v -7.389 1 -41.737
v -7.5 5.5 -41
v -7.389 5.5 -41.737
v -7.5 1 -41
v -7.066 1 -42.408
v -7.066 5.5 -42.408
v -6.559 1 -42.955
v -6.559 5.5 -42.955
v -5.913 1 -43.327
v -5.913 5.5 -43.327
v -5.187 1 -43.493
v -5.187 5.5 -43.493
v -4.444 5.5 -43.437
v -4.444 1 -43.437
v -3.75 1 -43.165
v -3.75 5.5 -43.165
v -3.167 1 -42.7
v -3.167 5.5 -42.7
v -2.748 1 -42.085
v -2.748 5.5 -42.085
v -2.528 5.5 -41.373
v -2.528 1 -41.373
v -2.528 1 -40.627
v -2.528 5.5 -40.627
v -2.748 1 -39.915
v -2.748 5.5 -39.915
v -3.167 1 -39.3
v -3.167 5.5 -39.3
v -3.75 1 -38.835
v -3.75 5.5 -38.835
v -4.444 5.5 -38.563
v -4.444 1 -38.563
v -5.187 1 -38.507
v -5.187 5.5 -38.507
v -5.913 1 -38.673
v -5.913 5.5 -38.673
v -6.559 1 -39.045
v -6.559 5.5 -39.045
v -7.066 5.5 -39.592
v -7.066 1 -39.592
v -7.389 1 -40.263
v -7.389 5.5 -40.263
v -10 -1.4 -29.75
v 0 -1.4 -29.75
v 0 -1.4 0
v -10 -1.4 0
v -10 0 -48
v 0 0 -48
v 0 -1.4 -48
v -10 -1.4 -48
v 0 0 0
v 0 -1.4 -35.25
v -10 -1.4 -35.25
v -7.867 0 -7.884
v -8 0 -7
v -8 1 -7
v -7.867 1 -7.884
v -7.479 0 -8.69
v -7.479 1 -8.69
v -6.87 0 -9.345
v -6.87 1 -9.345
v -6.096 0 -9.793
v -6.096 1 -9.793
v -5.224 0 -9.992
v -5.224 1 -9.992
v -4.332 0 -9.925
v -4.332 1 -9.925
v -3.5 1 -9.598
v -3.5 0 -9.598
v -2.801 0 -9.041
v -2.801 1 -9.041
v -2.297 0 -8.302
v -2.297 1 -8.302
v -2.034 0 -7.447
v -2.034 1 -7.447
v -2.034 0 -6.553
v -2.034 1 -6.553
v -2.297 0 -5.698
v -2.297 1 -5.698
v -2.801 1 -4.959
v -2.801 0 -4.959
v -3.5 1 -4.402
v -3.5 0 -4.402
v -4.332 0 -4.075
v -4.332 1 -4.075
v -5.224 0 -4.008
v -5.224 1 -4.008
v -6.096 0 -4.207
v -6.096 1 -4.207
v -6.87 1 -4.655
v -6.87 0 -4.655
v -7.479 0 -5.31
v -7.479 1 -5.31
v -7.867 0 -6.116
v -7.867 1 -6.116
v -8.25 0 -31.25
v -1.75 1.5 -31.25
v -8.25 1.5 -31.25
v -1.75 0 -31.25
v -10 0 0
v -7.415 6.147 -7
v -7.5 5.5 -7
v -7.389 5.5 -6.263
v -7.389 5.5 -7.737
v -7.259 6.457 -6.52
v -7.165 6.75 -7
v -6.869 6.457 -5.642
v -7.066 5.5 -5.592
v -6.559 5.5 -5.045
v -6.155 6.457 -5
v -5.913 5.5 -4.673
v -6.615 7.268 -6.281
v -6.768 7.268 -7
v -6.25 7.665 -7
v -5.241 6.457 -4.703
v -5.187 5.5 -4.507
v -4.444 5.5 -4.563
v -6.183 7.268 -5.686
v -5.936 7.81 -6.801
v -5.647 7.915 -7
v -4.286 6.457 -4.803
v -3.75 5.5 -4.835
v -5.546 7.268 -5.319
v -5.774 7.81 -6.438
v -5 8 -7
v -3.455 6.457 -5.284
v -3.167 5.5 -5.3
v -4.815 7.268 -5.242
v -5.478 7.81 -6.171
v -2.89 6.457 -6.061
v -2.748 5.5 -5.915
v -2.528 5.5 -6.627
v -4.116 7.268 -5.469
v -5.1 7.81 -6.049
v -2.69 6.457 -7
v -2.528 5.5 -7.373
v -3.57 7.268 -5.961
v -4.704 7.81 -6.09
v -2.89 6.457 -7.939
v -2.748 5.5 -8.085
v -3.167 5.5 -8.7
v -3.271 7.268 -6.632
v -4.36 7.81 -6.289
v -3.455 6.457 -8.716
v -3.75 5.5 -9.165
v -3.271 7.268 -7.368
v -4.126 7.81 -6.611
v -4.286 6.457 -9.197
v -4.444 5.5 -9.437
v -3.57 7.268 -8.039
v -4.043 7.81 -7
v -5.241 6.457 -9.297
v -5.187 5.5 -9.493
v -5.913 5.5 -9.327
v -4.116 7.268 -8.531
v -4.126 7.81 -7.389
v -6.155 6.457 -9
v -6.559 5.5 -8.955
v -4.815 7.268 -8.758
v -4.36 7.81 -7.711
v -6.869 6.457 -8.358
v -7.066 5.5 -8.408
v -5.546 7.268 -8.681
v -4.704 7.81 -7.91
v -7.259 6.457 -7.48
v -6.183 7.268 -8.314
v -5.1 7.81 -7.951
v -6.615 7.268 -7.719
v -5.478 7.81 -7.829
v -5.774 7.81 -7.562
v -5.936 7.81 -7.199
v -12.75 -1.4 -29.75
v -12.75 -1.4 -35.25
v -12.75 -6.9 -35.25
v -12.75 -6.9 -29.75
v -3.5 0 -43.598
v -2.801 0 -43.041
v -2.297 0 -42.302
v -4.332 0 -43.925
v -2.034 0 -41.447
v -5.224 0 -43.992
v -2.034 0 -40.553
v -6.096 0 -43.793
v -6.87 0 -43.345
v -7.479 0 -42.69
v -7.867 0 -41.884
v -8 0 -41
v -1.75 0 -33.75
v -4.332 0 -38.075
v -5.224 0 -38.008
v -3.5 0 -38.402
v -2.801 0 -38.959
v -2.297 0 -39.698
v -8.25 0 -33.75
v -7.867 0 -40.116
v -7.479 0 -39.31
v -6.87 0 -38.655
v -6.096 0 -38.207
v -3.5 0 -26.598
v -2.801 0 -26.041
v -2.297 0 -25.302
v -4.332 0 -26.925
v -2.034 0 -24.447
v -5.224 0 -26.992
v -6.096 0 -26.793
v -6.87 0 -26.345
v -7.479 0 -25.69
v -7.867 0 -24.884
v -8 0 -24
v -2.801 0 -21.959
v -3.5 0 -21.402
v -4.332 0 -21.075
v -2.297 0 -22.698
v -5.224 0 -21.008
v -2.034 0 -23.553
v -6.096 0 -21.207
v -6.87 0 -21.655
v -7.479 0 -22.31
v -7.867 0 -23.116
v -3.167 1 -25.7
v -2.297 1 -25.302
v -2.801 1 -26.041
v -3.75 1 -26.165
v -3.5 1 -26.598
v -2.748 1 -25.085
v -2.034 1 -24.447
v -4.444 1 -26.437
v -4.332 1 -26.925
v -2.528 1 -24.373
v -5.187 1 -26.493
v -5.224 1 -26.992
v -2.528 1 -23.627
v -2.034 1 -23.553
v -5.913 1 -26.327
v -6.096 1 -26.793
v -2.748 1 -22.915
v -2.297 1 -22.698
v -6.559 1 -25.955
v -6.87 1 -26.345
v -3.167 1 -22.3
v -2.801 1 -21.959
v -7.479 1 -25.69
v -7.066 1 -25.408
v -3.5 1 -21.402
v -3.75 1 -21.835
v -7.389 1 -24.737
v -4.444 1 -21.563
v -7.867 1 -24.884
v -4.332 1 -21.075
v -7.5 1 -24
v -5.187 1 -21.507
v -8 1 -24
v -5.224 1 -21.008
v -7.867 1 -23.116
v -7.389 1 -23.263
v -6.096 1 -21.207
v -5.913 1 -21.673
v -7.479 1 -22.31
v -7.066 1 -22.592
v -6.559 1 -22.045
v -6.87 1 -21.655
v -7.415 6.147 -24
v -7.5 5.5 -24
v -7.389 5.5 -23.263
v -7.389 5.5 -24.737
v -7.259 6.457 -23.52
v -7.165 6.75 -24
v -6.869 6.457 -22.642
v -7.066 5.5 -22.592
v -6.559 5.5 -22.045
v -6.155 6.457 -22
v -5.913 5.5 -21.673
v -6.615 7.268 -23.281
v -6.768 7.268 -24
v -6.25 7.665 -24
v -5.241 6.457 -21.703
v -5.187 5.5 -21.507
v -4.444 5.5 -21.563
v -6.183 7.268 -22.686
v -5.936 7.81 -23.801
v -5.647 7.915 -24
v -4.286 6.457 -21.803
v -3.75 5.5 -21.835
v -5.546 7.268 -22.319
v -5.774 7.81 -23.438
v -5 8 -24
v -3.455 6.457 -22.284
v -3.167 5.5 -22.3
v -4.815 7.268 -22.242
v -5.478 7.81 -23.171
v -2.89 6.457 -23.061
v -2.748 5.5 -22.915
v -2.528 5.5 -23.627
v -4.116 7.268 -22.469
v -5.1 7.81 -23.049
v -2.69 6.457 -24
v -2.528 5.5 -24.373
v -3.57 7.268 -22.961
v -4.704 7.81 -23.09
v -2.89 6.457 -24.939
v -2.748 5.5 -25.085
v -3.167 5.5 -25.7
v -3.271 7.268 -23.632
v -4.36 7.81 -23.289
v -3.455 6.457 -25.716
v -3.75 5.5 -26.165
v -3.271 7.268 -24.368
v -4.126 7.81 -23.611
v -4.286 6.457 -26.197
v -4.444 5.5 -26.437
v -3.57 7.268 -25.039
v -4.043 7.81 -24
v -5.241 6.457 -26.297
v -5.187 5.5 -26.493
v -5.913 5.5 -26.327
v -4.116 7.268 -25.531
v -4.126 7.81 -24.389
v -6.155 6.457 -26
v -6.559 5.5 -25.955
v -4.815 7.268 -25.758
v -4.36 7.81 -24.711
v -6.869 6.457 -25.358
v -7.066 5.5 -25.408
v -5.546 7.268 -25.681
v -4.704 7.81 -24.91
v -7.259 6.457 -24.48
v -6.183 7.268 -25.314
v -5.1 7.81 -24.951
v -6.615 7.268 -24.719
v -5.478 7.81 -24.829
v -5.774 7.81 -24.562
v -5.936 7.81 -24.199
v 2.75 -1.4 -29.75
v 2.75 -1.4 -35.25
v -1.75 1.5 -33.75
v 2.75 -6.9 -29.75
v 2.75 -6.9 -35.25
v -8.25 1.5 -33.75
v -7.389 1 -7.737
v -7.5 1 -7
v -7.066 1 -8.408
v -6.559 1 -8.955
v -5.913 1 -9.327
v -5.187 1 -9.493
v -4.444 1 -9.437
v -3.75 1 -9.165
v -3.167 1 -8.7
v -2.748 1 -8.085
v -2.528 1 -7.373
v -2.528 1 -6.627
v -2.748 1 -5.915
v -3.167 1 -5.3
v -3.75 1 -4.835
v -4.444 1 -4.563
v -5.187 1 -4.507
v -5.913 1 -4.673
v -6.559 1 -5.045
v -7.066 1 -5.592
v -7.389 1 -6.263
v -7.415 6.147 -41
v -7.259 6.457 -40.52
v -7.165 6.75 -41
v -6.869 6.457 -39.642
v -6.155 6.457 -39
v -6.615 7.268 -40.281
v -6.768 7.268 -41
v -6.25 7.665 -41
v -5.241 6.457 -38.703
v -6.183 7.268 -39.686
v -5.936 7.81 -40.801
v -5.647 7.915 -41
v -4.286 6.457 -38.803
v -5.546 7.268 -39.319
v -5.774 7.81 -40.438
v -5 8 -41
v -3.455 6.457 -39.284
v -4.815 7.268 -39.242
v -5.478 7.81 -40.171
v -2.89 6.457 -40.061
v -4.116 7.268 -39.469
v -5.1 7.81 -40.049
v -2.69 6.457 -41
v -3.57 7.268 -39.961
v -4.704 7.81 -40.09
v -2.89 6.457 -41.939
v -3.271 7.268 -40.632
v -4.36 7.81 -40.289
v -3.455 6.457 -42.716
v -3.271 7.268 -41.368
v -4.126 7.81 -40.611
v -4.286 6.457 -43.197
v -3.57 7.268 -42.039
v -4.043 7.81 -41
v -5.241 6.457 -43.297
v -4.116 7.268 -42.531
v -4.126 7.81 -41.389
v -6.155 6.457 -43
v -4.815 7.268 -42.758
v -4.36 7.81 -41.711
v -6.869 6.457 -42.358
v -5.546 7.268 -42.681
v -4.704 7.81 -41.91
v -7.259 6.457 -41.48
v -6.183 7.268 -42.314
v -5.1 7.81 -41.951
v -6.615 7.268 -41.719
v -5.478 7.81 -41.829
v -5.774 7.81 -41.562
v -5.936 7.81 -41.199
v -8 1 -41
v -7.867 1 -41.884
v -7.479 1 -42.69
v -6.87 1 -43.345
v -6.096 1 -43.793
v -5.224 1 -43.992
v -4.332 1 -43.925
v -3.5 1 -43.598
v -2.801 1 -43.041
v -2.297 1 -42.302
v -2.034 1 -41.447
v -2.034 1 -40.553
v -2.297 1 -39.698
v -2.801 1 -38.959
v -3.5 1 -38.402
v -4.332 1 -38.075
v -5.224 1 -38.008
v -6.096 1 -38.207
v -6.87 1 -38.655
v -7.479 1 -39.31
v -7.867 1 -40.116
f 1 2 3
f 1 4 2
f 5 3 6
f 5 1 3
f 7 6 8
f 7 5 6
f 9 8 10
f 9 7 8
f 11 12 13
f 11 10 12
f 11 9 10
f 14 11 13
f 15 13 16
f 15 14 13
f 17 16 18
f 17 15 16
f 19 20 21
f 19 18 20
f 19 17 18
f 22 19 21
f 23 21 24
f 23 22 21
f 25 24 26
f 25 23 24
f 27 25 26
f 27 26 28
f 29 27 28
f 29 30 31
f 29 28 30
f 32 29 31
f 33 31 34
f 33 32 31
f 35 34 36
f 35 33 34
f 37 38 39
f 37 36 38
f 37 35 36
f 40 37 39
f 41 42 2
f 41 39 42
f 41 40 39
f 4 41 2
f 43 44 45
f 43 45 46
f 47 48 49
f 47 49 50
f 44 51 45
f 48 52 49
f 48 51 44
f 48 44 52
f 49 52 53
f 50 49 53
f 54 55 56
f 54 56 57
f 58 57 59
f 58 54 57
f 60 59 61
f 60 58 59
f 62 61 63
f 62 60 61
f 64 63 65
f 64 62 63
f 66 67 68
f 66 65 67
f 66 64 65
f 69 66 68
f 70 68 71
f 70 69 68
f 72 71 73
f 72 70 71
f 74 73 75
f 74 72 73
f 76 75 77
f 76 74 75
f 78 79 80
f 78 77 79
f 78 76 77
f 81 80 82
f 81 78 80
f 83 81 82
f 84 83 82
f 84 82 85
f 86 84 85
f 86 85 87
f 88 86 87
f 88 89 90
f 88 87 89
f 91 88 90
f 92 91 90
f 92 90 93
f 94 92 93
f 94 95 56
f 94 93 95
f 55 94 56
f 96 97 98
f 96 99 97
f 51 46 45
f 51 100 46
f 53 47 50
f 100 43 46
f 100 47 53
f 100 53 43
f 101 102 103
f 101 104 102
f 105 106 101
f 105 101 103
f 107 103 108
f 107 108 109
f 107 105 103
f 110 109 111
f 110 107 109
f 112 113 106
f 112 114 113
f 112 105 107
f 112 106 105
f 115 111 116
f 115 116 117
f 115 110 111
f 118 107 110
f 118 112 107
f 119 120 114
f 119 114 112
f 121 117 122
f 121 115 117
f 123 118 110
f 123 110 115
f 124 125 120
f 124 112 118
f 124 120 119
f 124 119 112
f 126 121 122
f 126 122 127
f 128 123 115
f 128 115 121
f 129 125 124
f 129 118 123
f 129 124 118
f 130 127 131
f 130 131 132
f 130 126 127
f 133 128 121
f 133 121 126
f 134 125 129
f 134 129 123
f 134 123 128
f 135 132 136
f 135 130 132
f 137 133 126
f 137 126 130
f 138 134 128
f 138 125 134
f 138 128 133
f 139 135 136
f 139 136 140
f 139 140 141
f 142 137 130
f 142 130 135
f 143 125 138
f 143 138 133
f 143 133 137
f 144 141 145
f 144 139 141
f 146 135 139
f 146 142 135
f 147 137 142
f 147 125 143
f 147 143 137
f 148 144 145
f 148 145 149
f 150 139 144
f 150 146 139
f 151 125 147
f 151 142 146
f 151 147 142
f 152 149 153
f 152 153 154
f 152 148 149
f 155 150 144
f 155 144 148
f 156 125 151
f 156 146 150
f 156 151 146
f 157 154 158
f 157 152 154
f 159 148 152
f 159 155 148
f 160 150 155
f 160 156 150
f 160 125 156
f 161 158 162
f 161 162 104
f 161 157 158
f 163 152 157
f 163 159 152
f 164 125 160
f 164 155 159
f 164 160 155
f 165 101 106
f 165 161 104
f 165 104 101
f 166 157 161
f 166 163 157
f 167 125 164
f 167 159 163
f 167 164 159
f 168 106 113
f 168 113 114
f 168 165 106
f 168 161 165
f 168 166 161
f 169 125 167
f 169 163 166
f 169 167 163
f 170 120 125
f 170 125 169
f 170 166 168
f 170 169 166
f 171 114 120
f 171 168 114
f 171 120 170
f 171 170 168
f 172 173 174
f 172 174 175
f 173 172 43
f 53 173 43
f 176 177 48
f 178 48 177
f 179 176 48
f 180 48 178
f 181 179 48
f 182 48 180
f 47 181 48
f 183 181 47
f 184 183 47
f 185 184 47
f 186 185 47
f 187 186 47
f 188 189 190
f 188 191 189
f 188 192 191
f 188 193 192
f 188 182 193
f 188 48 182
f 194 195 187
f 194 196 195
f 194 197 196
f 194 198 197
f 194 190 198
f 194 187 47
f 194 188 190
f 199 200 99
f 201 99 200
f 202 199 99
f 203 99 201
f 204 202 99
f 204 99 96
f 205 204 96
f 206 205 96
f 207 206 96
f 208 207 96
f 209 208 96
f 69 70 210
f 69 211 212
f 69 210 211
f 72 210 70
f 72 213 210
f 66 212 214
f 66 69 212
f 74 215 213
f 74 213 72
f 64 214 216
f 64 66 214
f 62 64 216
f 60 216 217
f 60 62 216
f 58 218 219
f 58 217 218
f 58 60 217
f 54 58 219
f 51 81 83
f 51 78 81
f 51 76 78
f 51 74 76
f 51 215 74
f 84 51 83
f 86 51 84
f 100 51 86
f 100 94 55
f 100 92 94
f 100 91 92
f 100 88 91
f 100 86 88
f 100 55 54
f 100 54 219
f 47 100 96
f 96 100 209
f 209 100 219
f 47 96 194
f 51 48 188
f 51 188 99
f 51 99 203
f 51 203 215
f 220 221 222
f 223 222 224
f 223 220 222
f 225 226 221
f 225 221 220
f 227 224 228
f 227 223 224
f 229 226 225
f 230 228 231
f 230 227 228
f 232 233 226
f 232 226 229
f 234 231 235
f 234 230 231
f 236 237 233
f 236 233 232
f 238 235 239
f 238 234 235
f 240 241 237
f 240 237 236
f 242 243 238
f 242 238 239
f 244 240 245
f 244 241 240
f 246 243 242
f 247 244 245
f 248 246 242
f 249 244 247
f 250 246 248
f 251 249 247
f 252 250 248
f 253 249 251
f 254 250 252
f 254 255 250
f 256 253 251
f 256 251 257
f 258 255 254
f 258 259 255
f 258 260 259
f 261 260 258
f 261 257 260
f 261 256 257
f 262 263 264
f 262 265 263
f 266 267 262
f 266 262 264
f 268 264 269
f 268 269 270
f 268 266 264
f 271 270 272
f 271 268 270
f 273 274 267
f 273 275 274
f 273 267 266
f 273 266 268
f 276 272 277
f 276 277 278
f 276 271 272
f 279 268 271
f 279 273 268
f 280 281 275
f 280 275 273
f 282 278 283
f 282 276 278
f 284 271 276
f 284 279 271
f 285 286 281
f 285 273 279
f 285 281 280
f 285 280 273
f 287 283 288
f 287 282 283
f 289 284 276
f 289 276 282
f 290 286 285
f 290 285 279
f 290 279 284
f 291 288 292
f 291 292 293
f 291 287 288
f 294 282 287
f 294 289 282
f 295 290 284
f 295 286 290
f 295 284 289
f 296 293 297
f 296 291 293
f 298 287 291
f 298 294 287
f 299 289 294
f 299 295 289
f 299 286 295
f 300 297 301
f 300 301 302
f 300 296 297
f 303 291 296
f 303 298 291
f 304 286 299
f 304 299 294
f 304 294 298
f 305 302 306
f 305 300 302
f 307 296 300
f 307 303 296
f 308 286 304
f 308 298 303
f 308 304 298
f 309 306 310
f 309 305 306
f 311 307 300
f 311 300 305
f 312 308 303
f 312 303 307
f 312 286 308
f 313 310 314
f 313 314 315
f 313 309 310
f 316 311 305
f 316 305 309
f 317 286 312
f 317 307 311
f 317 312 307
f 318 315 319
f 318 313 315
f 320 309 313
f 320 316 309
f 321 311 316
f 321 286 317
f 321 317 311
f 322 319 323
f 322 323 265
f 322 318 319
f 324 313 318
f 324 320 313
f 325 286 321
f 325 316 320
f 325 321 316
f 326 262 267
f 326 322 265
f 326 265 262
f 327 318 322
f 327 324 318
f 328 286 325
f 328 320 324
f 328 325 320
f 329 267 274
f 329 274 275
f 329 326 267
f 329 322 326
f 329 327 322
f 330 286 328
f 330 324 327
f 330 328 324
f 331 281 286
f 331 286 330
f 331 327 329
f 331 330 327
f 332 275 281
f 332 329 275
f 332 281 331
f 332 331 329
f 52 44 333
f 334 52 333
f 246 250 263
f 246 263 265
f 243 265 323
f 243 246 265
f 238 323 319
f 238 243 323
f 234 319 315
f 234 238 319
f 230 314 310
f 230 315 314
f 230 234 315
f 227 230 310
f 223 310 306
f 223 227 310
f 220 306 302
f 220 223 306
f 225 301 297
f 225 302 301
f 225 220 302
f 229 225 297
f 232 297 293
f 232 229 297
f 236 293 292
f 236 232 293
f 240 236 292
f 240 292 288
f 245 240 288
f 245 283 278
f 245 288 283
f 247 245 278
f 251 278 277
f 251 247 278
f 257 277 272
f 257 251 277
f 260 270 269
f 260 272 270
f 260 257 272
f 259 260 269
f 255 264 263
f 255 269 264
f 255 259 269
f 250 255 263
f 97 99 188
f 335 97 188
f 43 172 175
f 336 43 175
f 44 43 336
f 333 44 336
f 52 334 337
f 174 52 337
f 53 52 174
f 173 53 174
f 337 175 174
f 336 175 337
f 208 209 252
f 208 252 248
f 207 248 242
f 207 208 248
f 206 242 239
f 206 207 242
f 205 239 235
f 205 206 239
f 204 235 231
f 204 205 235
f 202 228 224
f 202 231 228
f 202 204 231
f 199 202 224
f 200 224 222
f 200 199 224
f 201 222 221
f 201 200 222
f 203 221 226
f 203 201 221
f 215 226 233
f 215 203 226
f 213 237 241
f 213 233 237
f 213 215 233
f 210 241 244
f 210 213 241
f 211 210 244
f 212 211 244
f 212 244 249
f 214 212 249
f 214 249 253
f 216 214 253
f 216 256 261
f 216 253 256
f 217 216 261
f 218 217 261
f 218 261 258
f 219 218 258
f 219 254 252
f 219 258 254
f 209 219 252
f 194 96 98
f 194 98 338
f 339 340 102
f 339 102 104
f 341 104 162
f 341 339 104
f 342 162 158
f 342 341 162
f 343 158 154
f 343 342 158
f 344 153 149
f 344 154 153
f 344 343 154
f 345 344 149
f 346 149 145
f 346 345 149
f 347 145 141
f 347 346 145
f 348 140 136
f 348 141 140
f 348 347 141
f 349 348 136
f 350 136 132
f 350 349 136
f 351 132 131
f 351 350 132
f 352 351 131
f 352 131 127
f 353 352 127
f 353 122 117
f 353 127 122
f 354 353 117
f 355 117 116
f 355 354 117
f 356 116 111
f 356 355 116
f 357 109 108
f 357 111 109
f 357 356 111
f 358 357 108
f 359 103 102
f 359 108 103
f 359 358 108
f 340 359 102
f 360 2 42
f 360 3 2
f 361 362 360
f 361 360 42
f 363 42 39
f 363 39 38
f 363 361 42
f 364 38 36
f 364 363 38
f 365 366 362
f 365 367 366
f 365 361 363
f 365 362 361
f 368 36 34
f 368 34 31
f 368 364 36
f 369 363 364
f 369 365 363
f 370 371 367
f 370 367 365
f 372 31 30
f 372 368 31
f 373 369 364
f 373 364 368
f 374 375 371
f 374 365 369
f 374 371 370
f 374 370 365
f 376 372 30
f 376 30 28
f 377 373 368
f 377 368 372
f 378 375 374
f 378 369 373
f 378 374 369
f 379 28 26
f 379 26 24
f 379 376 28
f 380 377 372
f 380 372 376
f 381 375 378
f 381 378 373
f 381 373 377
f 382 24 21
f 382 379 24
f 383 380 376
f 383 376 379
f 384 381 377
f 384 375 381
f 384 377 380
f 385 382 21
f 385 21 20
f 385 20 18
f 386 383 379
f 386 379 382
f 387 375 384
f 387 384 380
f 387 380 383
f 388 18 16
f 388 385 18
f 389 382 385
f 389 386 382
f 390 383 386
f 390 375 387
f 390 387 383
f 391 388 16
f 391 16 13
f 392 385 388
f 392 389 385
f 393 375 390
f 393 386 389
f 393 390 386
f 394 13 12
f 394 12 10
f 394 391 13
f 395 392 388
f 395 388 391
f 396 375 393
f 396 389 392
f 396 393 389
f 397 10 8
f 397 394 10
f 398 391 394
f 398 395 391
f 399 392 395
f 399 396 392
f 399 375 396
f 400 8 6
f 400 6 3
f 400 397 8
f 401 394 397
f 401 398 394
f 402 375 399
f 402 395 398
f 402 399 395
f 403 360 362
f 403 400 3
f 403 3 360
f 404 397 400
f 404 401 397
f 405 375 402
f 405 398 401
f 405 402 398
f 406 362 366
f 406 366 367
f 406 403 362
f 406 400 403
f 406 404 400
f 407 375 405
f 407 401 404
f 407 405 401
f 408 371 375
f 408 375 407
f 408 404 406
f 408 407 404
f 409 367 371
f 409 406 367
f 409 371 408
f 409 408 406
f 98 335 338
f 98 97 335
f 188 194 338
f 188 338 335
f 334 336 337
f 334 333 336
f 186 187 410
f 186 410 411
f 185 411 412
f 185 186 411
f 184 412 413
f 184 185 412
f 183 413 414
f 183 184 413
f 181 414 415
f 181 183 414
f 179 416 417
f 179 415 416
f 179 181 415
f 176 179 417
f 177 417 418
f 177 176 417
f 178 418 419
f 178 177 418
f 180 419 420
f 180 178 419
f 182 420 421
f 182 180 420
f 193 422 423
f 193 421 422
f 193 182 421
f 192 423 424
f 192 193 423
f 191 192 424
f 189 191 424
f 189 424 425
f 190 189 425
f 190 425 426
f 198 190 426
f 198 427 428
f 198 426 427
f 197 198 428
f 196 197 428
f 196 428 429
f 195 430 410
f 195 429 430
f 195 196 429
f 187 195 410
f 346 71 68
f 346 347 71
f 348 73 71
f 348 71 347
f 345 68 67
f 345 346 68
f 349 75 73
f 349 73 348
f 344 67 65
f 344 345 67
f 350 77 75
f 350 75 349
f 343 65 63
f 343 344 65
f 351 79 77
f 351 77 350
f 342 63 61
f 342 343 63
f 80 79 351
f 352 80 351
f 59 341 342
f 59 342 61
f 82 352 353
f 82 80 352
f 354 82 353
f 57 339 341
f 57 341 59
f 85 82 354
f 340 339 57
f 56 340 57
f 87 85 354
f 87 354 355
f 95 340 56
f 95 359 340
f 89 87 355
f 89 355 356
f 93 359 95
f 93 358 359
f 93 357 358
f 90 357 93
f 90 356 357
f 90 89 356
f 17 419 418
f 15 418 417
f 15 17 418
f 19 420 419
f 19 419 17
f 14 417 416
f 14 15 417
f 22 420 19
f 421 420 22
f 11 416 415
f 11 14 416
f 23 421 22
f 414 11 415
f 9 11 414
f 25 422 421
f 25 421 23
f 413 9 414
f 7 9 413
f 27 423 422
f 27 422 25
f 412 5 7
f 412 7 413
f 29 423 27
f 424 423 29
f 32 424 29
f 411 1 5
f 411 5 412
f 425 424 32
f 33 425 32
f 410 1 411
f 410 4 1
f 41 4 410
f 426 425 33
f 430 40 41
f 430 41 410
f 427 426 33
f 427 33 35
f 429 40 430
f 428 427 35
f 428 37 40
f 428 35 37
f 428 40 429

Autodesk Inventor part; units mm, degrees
ref_plane "YZ Plane" through (0, 0, 0) normal (1, 0, 0) x (0, 1, 0)
ref_plane "XZ Plane" through (0, 0, 0) normal (0, 1, 0) x (-1, 0, 0)
ref_plane "XY Plane" through (0, 0, 0) normal (0, 0, 1) x (1, 0, 0)
sketch "Sketch1" plane through (0, 0, 0) normal (0, 1, 0) x (-1, 0, 0)
  line L0 (10, 0) -> (0, 0)
  line L1 (0, 0) -> (0, -48)
  line L2 (0, -48) -> (10, -48)
  line L3 (10, -48) -> (10, 0)
  circle A0 centre (5, -7) radius 2.5
  circle A1 centre (5, -24) radius 2.5
  circle A2 centre (5, -41) radius 2.5
  circle A3 centre (5, -7) radius 3
  circle A4 centre (5, -24) radius 3
  circle A5 centre (5, -41) radius 3
  line L4 (5, -16) -> (5, -46.75) construction
  line L5 (8.25, -33.75) -> (1.75, -33.75)
  line L6 (1.75, -31.25) -> (8.25, -31.25)
  line L7 (6.1849, -32.5) -> (1.6849, -32.5) construction
  line L8 (8.25, -31.25) -> (8.25, -33.75)
  line L9 (1.75, -31.25) -> (1.75, -33.75)
  dimension "d0" = 48
  dimension "d1" = 10
  dimension "d4" = 5
  dimension "d24" = 6
  dimension "d48" = 7
  dimension "d49" = 24
  dimension "d50" = 41
  dimension "d51" = 2.5
  dimension "d52" = 15.5
  dimension "d53" = 6.5
extrude "Extrusion1" add sketch "Sketch1" against normal blind 1.4 contours L3 L2 L1 L0 | A0 | A1 | A2 | A3 | A4 | A5 | L5 L9 L6 L8
extrude "Extrusion5" add sketch "Sketch1" along normal blind 8 contours A0
extrude "Extrusion6" add sketch "Sketch1" along normal blind 1 contours A3
fillet "Fillet4" radius 2.5 1 edges at (-2.5, 8, -7)
extrude "Extrusion7" add sketch "Sketch1" along normal blind 1 contours A4
extrude "Extrusion8" add sketch "Sketch1" along normal blind 8 contours A1
fillet "Fillet5" radius 2.5 1 edges at (-2.5, 8, -24)
extrude "Extrusion9" add sketch "Sketch1" along normal blind 8 contours A2
extrude "Extrusion10" add sketch "Sketch1" along normal blind 1 contours A5
fillet "Fillet6" radius 2.5 1 edges at (-2.5, 8, -41)
sketch "Sketch2" plane through (-5, 8, -24) normal (0, 1, 0) x (1, 0, 0)
  point P0 (0, 0)
sketch "Sketch3" plane through (0, -1.4, 0) normal (0, -1, 0) x (1, 0, 0)
  line L0 (-5, -16) -> (-5, -46.75) construction
  line L1 (-6.1849, -32.5) -> (-1.6849, -32.5) construction
  line L2 (-12.75, -29.75) -> (2.75, -29.75)
  line L3 (2.75, -29.75) -> (2.75, -35.25)
  line L4 (2.75, -35.25) -> (-12.75, -35.25)
  line L5 (-12.75, -35.25) -> (-12.75, -29.75)
  point P0 (0, 0)
  dimension "d56" = 15.5
  dimension "d57" = 5.5
extrude "Extrusion12" add sketch "Sketch3" along normal blind 5.5
extrude "Extrusion13" add sketch "Sketch1" along normal blind 1.5 contours L5 L9 L6 L8
properties part number "Led_Board_V1"
